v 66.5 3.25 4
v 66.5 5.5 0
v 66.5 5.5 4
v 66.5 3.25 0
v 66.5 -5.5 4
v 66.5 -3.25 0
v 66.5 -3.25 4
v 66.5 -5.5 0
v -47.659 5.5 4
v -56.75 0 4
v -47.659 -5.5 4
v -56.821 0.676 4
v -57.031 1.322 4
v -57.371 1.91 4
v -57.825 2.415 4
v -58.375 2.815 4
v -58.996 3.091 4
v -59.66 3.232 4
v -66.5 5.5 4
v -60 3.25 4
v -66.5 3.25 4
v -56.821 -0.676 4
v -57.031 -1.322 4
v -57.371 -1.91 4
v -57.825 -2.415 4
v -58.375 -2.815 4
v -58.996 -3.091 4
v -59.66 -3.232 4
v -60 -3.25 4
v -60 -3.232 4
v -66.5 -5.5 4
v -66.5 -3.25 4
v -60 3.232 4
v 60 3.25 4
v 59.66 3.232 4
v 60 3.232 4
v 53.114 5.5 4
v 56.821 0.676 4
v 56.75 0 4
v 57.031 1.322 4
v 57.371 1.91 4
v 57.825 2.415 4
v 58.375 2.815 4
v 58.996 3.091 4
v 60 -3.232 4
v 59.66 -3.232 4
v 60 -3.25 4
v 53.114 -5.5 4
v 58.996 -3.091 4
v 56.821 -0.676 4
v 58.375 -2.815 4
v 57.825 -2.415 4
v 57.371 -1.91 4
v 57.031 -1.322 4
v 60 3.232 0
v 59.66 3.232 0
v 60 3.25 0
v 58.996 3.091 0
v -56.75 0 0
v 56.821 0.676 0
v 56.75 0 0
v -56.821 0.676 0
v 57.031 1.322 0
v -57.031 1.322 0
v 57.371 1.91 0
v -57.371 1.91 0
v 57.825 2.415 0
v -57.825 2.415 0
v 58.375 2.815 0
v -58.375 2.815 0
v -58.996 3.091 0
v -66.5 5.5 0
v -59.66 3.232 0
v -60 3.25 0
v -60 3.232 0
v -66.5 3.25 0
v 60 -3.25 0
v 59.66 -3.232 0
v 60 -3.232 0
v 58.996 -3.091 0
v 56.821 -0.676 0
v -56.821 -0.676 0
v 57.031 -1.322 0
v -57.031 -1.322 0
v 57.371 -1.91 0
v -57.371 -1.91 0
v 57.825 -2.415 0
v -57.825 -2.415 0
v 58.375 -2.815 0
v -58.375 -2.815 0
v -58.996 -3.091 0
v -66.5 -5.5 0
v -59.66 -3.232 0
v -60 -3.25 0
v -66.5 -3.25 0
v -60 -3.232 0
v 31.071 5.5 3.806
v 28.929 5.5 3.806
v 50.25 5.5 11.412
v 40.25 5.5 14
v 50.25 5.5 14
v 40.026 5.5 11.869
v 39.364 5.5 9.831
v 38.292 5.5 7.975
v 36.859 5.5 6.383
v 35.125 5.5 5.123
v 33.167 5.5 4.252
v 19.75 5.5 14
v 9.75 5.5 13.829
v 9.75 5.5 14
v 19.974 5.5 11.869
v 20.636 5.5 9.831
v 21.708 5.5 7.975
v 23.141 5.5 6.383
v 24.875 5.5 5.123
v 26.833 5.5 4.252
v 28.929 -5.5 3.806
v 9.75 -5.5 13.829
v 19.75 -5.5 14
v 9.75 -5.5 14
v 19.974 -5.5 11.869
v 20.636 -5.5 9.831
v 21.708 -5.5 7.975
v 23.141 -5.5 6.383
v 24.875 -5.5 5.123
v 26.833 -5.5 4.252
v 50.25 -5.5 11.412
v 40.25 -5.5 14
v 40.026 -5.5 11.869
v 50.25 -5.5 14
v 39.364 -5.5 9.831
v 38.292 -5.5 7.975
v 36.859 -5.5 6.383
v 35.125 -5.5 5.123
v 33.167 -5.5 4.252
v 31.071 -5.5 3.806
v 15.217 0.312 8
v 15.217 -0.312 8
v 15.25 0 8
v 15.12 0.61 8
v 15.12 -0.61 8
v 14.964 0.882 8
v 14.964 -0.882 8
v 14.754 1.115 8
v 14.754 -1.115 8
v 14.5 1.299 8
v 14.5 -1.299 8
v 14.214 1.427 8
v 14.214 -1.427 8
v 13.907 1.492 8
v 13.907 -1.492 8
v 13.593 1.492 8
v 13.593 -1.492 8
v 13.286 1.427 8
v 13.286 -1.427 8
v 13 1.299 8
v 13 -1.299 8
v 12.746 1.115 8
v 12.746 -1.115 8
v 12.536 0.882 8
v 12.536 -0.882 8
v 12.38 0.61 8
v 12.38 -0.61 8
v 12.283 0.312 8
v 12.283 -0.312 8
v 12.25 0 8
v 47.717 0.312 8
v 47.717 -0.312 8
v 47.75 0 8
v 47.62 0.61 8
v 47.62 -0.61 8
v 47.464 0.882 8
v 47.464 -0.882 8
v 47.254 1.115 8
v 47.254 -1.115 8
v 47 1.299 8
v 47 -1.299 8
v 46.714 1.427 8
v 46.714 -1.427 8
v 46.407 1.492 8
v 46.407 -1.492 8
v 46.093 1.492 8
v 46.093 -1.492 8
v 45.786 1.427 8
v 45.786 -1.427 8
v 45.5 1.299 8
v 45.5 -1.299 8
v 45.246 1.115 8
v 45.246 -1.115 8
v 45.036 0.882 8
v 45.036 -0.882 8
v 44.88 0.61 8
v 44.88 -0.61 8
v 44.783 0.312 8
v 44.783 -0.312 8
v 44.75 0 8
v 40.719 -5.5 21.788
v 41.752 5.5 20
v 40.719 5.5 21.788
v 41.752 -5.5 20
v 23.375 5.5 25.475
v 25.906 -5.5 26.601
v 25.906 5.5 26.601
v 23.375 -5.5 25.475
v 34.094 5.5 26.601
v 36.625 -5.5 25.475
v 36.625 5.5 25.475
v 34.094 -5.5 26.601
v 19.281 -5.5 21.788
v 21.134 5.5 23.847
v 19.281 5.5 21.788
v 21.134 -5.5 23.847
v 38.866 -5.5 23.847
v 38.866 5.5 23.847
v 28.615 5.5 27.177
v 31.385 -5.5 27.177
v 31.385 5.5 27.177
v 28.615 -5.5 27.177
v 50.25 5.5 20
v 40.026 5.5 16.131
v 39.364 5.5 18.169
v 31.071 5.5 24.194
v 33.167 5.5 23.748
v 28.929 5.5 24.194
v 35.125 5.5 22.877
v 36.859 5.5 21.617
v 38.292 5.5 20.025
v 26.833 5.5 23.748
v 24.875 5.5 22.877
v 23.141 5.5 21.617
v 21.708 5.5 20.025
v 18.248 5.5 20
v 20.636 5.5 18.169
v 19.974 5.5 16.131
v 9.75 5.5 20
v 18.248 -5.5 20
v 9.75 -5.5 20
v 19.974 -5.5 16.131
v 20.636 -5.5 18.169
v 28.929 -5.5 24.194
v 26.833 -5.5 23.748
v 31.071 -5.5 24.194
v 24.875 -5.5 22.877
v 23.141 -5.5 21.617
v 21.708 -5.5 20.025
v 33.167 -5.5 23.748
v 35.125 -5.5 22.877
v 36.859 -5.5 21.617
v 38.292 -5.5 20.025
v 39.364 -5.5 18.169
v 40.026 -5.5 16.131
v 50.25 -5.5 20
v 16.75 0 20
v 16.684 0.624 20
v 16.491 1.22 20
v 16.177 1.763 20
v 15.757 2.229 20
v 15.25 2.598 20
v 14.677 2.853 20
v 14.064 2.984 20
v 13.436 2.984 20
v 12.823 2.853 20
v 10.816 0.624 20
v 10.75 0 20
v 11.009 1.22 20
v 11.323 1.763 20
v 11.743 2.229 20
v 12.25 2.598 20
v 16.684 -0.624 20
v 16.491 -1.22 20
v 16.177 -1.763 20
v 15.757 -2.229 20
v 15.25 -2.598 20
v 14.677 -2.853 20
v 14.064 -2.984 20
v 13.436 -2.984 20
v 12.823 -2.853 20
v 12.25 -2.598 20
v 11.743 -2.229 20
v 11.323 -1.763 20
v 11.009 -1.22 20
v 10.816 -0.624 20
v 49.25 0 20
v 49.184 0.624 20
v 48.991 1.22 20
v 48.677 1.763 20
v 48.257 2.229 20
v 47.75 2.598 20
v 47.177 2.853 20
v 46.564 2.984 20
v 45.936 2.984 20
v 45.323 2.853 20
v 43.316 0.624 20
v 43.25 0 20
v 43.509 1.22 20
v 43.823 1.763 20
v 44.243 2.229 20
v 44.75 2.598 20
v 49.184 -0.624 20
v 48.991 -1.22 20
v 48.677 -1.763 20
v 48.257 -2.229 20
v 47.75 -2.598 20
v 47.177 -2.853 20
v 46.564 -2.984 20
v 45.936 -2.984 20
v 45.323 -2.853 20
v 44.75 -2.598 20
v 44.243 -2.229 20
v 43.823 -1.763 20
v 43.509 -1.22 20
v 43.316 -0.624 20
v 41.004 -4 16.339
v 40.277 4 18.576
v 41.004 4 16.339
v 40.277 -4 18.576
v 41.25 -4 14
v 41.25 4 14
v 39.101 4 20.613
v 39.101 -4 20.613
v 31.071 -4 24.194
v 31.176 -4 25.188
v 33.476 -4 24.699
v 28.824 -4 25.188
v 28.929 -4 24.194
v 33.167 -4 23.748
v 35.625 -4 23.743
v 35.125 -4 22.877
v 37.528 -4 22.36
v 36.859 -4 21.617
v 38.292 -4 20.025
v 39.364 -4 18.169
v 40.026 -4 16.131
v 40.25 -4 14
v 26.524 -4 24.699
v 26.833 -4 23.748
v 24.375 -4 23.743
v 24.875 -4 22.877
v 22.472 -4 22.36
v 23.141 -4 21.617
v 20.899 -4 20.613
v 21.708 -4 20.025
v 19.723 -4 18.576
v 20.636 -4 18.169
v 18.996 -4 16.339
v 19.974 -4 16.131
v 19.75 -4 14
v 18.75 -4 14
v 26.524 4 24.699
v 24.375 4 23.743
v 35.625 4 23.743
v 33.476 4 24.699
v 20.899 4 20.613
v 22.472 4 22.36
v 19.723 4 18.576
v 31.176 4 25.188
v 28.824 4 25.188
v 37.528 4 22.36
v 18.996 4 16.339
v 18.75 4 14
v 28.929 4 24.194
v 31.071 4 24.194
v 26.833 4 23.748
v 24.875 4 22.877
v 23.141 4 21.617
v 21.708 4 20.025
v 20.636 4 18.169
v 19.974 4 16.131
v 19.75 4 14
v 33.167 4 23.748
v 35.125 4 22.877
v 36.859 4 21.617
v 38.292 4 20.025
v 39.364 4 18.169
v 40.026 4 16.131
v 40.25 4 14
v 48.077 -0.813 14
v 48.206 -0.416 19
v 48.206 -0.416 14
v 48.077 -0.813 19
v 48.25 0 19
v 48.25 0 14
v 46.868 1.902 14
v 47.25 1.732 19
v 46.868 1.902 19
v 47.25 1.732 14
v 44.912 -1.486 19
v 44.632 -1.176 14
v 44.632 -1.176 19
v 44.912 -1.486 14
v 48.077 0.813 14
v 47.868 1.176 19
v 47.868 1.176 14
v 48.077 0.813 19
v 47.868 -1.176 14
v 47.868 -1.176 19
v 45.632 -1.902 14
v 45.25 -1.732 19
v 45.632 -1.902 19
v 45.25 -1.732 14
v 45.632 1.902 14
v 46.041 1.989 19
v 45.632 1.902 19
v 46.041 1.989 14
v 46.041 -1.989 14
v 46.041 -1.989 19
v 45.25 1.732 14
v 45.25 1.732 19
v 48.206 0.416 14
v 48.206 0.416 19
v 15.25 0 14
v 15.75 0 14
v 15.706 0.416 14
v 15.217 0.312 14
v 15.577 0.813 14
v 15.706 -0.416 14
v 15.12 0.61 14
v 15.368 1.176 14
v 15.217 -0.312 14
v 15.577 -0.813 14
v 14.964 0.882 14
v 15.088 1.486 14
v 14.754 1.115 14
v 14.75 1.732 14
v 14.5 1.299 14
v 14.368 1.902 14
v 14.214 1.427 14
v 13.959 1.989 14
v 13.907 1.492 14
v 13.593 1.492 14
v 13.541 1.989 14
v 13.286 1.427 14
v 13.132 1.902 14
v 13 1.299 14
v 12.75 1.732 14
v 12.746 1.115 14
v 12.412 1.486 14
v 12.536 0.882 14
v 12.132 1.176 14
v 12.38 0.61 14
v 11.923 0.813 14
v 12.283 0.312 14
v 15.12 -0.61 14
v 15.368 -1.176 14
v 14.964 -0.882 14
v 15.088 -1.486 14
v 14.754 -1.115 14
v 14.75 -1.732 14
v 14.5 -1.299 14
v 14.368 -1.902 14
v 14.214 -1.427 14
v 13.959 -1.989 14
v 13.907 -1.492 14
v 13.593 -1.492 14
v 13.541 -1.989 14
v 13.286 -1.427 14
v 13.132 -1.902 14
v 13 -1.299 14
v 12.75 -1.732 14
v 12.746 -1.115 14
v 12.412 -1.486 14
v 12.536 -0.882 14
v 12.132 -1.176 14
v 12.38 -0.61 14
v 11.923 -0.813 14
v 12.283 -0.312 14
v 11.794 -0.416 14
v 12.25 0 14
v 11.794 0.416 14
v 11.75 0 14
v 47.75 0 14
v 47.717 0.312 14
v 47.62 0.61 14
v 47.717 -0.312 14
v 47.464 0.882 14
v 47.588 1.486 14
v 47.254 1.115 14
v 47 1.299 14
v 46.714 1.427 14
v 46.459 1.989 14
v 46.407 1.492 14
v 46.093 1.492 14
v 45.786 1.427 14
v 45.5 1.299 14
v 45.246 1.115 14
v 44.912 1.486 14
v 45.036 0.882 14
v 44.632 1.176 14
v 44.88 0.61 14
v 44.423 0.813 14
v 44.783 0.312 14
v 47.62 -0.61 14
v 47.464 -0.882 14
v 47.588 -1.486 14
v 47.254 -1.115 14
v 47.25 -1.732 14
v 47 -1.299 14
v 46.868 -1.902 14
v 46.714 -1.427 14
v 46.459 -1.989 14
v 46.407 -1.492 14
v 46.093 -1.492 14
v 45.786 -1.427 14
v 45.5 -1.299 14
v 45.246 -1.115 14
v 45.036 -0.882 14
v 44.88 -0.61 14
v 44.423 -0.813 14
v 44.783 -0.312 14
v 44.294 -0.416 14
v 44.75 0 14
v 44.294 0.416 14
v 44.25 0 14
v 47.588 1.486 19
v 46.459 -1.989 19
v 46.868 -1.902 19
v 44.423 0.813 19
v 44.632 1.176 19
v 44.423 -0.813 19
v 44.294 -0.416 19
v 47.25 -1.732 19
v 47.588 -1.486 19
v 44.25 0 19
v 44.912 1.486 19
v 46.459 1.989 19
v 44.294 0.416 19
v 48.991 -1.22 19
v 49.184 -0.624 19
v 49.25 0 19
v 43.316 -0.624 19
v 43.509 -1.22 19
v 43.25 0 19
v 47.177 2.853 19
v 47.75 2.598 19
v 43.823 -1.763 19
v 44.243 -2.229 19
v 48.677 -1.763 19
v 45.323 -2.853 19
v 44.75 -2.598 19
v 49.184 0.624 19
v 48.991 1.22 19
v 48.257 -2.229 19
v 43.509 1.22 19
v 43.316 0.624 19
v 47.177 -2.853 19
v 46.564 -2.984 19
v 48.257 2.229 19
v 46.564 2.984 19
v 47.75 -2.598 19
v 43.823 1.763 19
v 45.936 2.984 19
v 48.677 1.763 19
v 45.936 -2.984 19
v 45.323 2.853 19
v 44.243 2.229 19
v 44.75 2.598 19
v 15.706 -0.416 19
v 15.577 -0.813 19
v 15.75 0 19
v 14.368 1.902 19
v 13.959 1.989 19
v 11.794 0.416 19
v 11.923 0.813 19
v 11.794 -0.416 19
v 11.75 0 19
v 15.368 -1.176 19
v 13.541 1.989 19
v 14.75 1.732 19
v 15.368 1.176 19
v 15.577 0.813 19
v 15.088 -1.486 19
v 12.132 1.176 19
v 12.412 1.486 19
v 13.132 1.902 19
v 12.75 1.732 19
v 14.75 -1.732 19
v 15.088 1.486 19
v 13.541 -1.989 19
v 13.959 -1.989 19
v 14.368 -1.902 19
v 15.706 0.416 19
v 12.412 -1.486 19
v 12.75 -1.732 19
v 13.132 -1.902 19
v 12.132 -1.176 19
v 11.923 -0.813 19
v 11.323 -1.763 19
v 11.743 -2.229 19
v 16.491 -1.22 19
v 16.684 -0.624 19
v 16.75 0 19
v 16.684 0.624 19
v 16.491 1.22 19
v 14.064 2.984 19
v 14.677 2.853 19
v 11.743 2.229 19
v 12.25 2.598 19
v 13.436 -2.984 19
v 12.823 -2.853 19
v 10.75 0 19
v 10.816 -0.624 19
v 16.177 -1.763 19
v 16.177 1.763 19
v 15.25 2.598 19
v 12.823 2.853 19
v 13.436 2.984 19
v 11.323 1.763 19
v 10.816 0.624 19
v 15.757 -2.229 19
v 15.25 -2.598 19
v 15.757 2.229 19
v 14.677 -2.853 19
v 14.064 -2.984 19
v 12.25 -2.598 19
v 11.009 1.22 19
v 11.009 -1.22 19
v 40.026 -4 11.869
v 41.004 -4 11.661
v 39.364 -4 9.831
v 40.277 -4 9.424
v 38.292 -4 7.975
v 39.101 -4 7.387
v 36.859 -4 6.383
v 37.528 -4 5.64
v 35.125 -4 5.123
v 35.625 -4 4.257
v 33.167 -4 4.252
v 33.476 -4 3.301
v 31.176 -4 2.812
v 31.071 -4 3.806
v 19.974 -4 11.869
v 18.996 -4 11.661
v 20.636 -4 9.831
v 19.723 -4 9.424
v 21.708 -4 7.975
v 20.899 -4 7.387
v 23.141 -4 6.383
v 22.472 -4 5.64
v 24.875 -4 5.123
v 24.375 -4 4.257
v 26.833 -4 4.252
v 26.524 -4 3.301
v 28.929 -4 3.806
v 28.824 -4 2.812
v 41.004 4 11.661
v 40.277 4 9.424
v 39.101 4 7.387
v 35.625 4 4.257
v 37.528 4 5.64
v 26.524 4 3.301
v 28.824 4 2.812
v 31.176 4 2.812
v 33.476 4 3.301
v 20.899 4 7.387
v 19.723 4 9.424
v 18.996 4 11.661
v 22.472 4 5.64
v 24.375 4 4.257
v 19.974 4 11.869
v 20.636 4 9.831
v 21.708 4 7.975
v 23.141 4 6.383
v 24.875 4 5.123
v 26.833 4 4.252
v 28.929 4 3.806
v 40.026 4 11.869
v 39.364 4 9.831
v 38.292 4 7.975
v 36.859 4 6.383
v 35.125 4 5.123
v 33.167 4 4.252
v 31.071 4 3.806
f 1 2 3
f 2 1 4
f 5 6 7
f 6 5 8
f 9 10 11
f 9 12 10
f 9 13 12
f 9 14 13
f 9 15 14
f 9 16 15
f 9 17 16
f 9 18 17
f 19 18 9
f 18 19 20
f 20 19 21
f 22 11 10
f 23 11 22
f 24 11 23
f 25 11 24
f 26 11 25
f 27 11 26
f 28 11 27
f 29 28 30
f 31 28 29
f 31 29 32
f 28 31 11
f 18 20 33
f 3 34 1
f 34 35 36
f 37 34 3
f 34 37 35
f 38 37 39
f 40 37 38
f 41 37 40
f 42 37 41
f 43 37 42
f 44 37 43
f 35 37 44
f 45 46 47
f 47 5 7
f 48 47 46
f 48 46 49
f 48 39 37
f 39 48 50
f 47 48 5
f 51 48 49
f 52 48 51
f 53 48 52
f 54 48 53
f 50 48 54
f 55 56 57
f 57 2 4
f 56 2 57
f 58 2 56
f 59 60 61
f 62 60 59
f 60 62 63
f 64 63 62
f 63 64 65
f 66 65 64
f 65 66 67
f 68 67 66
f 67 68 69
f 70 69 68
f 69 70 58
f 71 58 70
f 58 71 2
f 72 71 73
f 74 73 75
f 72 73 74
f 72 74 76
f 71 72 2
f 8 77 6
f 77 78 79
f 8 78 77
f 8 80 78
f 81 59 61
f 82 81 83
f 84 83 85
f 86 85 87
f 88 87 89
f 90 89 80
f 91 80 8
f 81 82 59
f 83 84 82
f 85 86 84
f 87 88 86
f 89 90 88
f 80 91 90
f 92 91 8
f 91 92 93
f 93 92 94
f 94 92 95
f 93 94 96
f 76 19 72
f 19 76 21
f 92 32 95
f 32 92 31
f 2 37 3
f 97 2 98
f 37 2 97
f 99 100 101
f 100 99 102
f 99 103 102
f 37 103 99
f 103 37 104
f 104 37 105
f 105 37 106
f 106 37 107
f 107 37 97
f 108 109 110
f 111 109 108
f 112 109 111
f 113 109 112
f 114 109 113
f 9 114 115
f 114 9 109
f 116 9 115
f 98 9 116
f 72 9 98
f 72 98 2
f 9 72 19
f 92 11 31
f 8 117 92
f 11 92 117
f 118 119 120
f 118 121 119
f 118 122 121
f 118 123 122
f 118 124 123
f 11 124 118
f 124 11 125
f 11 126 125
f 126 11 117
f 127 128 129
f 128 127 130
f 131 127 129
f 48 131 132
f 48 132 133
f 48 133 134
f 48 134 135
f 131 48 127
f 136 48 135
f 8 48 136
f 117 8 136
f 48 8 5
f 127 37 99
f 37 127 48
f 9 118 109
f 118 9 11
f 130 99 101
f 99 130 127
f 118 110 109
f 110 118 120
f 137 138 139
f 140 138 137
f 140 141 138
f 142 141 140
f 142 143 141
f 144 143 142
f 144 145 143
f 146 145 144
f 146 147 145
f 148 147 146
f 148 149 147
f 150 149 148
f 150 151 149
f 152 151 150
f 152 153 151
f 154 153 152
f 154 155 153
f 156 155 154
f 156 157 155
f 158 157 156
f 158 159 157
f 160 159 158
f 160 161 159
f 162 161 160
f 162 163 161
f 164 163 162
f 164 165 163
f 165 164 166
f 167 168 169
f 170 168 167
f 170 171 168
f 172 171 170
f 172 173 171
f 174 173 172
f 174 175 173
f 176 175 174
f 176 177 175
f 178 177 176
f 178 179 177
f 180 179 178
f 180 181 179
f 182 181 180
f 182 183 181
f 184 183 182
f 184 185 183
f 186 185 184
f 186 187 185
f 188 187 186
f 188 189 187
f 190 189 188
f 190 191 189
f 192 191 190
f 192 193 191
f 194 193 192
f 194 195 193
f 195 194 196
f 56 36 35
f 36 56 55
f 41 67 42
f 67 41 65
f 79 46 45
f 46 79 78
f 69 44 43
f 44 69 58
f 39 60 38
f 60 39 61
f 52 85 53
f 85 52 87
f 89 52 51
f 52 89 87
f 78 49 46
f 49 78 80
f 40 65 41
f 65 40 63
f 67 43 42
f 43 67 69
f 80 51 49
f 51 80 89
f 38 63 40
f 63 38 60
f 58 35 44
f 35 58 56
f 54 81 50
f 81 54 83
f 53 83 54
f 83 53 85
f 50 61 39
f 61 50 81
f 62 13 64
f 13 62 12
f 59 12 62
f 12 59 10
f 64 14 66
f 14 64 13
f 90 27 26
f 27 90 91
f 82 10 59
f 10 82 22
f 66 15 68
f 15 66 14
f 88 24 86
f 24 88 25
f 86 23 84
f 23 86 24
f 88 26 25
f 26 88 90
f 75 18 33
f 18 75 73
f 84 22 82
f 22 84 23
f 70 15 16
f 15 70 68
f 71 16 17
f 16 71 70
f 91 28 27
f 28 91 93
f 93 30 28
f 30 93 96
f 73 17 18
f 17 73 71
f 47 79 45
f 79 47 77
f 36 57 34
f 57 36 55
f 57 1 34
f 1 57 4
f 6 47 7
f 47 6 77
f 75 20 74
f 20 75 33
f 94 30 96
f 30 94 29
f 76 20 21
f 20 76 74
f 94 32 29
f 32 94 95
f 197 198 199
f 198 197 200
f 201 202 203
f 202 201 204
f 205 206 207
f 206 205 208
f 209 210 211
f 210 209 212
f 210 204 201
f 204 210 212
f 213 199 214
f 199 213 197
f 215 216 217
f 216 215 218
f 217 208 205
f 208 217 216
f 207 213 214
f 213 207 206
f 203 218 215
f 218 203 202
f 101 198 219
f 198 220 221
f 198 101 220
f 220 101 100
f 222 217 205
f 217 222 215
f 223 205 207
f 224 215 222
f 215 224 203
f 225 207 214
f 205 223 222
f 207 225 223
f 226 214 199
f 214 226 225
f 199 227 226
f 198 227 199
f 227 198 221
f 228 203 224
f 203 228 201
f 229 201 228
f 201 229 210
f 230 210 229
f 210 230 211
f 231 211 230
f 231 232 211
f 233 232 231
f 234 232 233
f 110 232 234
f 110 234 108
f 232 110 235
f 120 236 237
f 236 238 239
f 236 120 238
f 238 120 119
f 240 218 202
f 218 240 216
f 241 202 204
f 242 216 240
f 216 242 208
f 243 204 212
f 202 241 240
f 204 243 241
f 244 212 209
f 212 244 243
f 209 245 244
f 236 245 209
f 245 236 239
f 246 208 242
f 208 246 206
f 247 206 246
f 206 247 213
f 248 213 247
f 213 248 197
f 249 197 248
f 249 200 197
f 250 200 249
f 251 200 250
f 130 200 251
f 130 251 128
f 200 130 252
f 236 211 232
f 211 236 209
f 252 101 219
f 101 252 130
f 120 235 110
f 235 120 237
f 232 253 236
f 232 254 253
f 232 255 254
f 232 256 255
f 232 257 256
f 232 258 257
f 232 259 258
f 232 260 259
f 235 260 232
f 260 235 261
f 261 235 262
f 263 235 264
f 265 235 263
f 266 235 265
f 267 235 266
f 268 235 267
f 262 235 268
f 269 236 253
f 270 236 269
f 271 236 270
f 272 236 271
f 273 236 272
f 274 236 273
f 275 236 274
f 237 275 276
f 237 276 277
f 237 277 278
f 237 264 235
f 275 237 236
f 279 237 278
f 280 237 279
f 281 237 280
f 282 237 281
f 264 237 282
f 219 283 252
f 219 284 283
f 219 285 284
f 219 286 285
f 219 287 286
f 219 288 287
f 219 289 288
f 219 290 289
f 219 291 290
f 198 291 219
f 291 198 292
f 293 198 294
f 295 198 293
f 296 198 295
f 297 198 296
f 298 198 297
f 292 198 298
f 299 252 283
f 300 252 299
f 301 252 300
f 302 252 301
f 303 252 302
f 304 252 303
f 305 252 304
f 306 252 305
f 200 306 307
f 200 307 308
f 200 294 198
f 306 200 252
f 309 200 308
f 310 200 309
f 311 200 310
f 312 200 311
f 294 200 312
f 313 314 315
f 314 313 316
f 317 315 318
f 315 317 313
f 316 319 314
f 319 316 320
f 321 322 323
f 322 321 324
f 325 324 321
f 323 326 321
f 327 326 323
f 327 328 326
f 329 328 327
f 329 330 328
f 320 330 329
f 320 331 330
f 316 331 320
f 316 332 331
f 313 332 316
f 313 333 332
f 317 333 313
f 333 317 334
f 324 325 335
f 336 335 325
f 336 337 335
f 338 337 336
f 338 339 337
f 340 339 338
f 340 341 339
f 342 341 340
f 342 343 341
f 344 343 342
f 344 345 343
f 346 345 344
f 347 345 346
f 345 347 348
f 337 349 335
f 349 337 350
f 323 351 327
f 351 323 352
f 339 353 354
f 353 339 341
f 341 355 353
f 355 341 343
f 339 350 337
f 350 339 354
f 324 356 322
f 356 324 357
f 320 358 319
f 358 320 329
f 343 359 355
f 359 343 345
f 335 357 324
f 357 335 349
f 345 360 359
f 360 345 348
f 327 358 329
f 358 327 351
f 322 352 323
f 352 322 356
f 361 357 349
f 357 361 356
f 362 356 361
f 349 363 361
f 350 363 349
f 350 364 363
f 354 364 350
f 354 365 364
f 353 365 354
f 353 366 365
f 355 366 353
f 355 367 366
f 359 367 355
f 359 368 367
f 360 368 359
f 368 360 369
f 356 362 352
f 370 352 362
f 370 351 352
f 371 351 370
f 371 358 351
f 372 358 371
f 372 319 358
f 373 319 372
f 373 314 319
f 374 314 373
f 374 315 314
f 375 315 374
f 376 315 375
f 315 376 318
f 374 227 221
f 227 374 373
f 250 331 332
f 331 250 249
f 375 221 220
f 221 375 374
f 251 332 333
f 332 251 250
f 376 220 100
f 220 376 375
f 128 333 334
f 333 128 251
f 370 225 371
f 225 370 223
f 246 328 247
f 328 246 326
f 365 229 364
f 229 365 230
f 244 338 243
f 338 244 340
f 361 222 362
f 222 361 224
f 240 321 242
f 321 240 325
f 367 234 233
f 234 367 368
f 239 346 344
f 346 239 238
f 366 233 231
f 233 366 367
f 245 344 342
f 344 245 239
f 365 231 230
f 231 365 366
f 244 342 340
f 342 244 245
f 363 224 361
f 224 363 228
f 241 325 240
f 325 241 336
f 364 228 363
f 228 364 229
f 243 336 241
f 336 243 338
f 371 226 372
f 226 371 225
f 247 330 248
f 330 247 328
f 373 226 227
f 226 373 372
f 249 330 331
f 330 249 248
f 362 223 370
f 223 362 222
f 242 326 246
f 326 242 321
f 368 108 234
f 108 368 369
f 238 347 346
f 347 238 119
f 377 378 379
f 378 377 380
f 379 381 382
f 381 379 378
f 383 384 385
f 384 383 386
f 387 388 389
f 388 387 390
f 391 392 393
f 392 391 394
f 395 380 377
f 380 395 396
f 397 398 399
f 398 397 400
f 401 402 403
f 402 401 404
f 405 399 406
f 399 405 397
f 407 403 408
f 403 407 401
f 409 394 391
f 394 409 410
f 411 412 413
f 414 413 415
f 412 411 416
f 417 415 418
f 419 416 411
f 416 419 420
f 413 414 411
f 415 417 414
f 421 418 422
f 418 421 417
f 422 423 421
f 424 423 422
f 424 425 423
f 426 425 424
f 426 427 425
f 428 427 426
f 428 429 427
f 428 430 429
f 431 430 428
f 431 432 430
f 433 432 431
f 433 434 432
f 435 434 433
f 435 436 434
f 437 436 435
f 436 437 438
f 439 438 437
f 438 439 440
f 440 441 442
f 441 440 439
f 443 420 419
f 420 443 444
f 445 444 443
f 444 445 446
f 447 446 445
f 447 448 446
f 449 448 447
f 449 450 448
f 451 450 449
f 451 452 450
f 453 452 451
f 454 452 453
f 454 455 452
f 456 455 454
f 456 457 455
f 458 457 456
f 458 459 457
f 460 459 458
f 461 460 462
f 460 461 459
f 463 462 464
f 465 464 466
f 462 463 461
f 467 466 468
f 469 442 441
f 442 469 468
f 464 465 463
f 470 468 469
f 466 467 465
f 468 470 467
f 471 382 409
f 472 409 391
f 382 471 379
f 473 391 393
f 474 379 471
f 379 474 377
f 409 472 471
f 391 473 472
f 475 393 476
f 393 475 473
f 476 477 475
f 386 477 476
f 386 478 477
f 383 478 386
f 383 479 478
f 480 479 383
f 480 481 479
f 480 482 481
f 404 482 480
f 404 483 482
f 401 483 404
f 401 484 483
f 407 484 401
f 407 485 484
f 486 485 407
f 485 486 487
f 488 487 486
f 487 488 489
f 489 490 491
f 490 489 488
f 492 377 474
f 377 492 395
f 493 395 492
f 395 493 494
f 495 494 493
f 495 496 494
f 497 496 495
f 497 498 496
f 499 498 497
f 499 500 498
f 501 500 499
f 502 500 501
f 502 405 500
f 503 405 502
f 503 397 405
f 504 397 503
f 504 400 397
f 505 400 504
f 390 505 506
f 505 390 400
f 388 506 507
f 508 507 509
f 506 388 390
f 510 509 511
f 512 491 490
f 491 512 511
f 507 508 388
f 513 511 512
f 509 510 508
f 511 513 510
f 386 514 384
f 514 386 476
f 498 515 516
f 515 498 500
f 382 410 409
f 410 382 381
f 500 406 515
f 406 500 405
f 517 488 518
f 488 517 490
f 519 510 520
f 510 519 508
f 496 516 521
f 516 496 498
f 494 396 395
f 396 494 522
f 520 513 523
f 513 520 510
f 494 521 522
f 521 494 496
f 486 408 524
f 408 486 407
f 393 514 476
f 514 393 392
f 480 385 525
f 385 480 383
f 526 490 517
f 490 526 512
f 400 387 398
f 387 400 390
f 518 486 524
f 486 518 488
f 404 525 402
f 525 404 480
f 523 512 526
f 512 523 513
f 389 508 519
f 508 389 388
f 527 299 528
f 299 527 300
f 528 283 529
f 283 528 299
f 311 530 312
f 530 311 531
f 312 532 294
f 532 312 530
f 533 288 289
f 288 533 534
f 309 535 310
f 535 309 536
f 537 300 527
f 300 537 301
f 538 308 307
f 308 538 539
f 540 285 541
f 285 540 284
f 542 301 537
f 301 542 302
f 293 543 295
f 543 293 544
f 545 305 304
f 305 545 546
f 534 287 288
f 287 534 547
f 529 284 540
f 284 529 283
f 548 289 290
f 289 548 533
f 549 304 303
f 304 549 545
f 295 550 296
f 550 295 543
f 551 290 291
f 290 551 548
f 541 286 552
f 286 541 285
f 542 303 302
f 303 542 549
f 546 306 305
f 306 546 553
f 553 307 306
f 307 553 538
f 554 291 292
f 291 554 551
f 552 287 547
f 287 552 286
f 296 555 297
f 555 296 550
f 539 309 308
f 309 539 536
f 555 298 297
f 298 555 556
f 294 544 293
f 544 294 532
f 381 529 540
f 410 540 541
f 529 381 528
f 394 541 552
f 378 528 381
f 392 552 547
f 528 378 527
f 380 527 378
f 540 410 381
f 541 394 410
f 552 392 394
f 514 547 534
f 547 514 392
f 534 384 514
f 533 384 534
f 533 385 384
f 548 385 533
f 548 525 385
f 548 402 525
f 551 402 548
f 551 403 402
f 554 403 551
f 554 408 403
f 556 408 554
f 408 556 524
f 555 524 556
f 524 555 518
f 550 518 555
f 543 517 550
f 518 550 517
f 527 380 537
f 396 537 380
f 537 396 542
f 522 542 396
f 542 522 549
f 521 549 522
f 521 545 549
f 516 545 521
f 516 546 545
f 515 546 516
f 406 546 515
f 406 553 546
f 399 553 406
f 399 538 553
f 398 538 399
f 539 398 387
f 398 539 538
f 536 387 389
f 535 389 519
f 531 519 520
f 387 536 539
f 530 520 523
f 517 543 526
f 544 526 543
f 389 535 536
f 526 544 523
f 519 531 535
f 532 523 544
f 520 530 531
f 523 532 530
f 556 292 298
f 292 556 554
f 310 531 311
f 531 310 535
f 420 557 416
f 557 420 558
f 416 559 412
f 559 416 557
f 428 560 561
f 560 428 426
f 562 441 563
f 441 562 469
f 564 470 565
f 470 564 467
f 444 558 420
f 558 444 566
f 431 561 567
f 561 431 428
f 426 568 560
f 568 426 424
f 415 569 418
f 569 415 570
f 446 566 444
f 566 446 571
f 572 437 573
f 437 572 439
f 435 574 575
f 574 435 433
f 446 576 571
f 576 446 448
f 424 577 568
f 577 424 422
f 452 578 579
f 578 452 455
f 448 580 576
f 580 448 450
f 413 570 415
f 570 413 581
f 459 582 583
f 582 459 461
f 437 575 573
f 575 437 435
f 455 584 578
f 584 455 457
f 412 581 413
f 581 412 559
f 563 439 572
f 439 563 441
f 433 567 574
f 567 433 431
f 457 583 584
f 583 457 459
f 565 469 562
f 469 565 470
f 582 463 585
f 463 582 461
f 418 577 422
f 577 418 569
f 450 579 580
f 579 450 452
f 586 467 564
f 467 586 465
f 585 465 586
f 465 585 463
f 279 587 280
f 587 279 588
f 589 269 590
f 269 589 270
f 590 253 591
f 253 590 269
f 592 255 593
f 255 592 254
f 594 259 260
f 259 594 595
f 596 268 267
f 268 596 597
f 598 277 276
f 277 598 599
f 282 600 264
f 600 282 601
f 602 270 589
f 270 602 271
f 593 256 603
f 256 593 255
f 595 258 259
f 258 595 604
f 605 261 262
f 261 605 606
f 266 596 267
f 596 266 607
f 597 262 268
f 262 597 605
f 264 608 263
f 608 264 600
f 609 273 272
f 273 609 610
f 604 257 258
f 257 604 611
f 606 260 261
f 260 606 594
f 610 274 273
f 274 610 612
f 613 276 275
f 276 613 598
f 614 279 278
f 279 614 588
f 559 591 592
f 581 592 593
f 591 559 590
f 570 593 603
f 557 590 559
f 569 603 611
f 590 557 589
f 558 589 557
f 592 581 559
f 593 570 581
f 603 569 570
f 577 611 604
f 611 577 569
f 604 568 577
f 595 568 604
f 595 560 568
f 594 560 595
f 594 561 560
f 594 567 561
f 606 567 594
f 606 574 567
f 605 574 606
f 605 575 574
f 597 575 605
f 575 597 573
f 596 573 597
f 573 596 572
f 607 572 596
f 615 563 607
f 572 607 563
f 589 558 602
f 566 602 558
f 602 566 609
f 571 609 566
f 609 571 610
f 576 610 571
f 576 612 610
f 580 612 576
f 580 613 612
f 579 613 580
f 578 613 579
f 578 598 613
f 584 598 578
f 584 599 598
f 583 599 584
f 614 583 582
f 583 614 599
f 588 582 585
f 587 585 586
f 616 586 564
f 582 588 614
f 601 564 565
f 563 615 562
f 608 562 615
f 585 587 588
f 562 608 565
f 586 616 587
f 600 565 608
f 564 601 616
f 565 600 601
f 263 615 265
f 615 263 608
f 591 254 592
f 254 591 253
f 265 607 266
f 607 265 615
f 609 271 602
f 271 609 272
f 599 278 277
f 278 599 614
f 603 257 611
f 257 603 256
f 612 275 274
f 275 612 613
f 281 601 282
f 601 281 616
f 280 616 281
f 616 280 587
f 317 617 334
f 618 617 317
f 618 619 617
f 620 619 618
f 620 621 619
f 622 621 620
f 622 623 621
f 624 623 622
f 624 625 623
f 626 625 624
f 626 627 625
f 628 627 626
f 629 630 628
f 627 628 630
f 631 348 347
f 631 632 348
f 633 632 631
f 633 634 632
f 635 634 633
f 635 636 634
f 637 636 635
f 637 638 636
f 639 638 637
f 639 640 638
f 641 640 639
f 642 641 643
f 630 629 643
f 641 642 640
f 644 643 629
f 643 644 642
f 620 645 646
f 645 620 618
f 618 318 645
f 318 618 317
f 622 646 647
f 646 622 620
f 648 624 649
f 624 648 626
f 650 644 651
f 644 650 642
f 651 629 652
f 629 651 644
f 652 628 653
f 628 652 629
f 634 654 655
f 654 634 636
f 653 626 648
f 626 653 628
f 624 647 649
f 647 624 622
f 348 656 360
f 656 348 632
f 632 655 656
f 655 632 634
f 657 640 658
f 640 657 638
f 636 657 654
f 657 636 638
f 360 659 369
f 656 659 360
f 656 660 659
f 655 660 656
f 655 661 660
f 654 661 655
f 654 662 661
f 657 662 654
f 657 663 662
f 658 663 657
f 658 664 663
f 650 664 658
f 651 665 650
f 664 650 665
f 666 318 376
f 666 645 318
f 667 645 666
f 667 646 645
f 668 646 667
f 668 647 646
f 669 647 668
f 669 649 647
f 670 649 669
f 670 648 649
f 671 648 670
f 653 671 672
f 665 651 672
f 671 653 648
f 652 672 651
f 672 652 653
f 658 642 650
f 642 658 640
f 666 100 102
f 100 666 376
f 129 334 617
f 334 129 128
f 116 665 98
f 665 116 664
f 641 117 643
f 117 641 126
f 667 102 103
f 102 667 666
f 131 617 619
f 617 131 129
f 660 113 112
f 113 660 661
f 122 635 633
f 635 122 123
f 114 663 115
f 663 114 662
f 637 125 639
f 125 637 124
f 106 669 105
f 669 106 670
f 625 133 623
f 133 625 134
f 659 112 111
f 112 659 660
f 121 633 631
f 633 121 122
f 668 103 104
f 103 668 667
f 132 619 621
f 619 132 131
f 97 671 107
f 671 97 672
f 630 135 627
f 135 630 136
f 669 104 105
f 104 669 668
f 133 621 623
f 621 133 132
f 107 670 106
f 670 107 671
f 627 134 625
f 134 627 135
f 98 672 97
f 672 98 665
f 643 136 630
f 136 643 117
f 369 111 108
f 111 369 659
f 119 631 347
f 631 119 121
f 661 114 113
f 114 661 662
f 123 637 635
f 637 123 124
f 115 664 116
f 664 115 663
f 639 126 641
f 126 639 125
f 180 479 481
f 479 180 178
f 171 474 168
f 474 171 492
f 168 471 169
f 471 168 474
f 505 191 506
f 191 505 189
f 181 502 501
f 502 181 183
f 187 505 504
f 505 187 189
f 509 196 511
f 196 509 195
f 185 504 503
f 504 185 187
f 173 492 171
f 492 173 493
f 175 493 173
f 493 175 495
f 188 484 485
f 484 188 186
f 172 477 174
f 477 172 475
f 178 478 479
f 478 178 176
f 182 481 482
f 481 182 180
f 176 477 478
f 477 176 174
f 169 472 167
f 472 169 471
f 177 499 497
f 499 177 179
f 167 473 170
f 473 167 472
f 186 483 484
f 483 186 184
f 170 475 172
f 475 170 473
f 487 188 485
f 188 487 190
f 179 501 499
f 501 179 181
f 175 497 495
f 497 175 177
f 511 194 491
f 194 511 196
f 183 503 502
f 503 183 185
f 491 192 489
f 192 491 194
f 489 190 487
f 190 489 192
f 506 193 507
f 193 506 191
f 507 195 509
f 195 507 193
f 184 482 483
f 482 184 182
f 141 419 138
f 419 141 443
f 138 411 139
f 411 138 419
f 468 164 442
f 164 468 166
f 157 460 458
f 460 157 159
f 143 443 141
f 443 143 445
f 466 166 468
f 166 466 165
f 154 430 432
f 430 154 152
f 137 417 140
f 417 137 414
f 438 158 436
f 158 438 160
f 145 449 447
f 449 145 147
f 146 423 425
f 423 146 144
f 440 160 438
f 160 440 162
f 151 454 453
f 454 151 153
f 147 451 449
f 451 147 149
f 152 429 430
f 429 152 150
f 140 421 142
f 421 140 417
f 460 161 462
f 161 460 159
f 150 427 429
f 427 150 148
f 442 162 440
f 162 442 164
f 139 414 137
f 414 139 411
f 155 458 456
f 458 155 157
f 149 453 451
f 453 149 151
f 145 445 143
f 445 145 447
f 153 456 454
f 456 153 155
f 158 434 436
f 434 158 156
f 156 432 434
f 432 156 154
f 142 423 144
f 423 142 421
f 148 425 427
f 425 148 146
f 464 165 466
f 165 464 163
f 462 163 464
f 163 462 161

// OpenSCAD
// file: bearing.scad
$fn=30;
drive_axle_r = 8.1/2;
drive_axle_bearing_id = 8;
drive_axle_bearing_od = 22.5;
drive_axle_bearing_t = 8;

bearing_holder_wall = 1.2;
bearing_holder_tie_hole_r = 3/2;
bearing_holder_cut = -1;

bearing_pillow_rim_t = 2;
bearing_pillow_side_t = 1.5;
bearing_pillow_screw_thread_r = 3/2;
bearing_pillow_screw_shank_r = 4/2;
bearing_pillow_screw_head_r = 6/2;

module bearing(id = drive_axle_bearing_id, od = drive_axle_bearing_od, t = drive_axle_bearing_t) {
    difference() {
        cylinder(r=od/2, h=t, center=true);
        cylinder(r=id/2, h=t*2, center=true);
    }
}

module bearing_holder(
    od = drive_axle_bearing_od,
    t = drive_axle_bearing_t,
    wall=bearing_holder_wall,
    tie_hole_r = bearing_holder_tie_hole_r
) {
    extra_length = wall*4 + tie_hole_r*4;
    tie_width = wall*2 + tie_hole_r*6;
    difference() {
        union() {
            cylinder(r=od/2+wall, h=t+wall*2, center=true);
            cube([od+extra_length,tie_width,t+wall*2], center=true);
        }
        cylinder(r=od/2-wall, h=t*3, center=true);
        bearing();
        translate([od/2+wall+tie_hole_r,tie_hole_r*2,0])
        cylinder(r=tie_hole_r, h=t*2, center=true);
        translate([-od/2-wall-tie_hole_r,tie_hole_r*2,0])
        cylinder(r=tie_hole_r, h=t*2, center=true);

        translate([od/2+wall+tie_hole_r,-tie_hole_r*2,0])
        cylinder(r=tie_hole_r, h=t*2, center=true);
        translate([-od/2-wall-tie_hole_r,-tie_hole_r*2,0])
        cylinder(r=tie_hole_r, h=t*2, center=true);
    }
}

module bearing_holder_negative(
    od = drive_axle_bearing_od,
    t = drive_axle_bearing_od +bearing_pillow_rim_t*2,
    wall=bearing_pillow_side_t,
    //tie_hole_r = bearing_holder_tie_hole_r
) {
    //extra_length = wall*4 + tie_hole_r*4-.2;
    //tie_width = wall*2 + tie_hole_r*6-.2;
        union() {
            cylinder(r=od/2+wall-.2, h=t+wall*2, center=true);
          //  cube([od+extra_length,tie_width,t+wall*2], center=true);
        }
     
}
//bearing_holder_negative();

module bearing_holder_bottom(
    od = drive_axle_bearing_od,
    t = drive_axle_bearing_t,
    wall=bearing_holder_wall,
    cut = bearing_holder_cut
) {
    
    difference() {
        bearing_holder();
        translate([0,0,od*3/2-cut])
        cube([od*2,od*3,od*3], center=true);
        translate([0,0,-cut])
        bearing_holder_keyway();
    }
}
//bearing_holder_bottom();

module bearing_holder_top(
    od = drive_axle_bearing_od,
    t = drive_axle_bearing_t,
    wall=bearing_holder_wall,
    cut = bearing_holder_cut
) {
    
    difference() {
        bearing_holder(od=od, t=t, wall=wall, cut=cut);
        translate([0,0,-od*3/2-cut])
        cube([od*2,od*3,od*3], center=true);
    }
    translate([0,0,-cut])
    bearing_holder_key();
}
//rotate(180,[1,0,0])
//bearing_holder_top();

module bearing_holder_pair(
    od = drive_axle_bearing_od,
    t = drive_axle_bearing_t,
    wall=bearing_holder_wall
){
    translate([0,-od/2-wall-2,t/2+wall])
    rotate(180, [0,1,0])
    bearing_holder_top();
    translate([0,od/2+wall+2,t/2+wall])
    bearing_holder_bottom();
}
//bearing_holder_pair();

module bearing_holder_key(
    od = drive_axle_bearing_od,
    t = drive_axle_bearing_t,
    wall=bearing_holder_wall,
    tie_hole_r = bearing_holder_tie_hole_r
) {
    translate([od/2+wall+tie_hole_r,0,0])
    cube([tie_hole_r*2,tie_hole_r,tie_hole_r], center=true);
    translate([-od/2-wall-tie_hole_r,0,0])
    cube([tie_hole_r*2,tie_hole_r,tie_hole_r], center=true);
}
module bearing_holder_keyway(
    od = drive_axle_bearing_od,
    t = drive_axle_bearing_t,
    wall=bearing_holder_wall,
    tie_hole_r = bearing_holder_tie_hole_r,
    clearance = 1
) {
    translate([od/2+wall+tie_hole_r,0,0])
    cube([tie_hole_r*2+clearance,tie_hole_r+clearance,tie_hole_r+clearance], center=true);
    translate([-od/2-wall-tie_hole_r,0,0])
    cube([tie_hole_r*2+clearance,tie_hole_r+clearance,tie_hole_r+clearance], center=true);
}

module bearing_pillow() {

    difference() {
        union() {
            cylinder(r=drive_axle_bearing_od/2 + bearing_pillow_rim_t, h=drive_axle_bearing_t + bearing_pillow_side_t*2, center=true);
            cube([drive_axle_bearing_od+bearing_pillow_rim_t*2+bearing_pillow_screw_head_r*4+2,12,drive_axle_bearing_t + bearing_pillow_side_t*2], center=true);
        }
      cylinder(r=drive_axle_bearing_od/2 - 1, h=drive_axle_bearing_t*8, center=true);
      bearing();
        
      translate([drive_axle_bearing_od/2+bearing_pillow_rim_t+bearing_pillow_screw_head_r,0,0])
        rotate(90,[1,0,0]) 
            cylinder(r=bearing_pillow_screw_thread_r, h=50, center=true);
      translate([drive_axle_bearing_od/2+bearing_pillow_rim_t+bearing_pillow_screw_head_r,10,0])
        rotate(90,[1,0,0]) 
            cylinder(r=bearing_pillow_screw_shank_r, h=20, center=true);
      translate([drive_axle_bearing_od/2+bearing_pillow_rim_t+bearing_pillow_screw_head_r,15,0])
        rotate(90,[1,0,0]) 
            cylinder(r=bearing_pillow_screw_head_r, h=20, center=true);

      translate([-drive_axle_bearing_od/2-bearing_pillow_rim_t-bearing_pillow_screw_head_r,0,0])
        rotate(90,[1,0,0]) 
            cylinder(r=bearing_pillow_screw_thread_r, h=50, center=true);
      translate([-drive_axle_bearing_od/2-bearing_pillow_rim_t-bearing_pillow_screw_head_r,10,0])
        rotate(90,[1,0,0]) 
            cylinder(r=bearing_pillow_screw_shank_r, h=20, center=true);
      translate([-drive_axle_bearing_od/2-bearing_pillow_rim_t-bearing_pillow_screw_head_r,15,0])
        rotate(90,[1,0,0]) 
            cylinder(r=bearing_pillow_screw_head_r, h=20, center=true);
    }
}
module bearing_pillow_negative() {

    cylinder(r=drive_axle_bearing_od/2 + bearing_pillow_rim_t, h=drive_axle_bearing_t + bearing_pillow_side_t*2, center=true);
    cylinder(r=drive_axle_bearing_od/2 + bearing_pillow_rim_t-1, h=drive_axle_bearing_t *4, center=true);
    cube([drive_axle_bearing_od+bearing_pillow_rim_t*2+bearing_pillow_screw_head_r*4+2,12,drive_axle_bearing_t + bearing_pillow_side_t*2], center=true);

}
//%bearing_pillow();
//bearing_pillow_negative();
module bearing_pillow_top() {
   difference() {
        bearing_pillow();
        translate([0,-50,0])
            cube([100,100,100], center=true);
   } 
}
module bearing_pillow_bottom() {
   difference() {
        bearing_pillow();
        translate([0,50,0])
            cube([100,100,100], center=true);
   } 
}
//bearing_pillow_top();
//translate([0,-5,0])
//bearing_pillow_bottom();
//bearing_pillow();
//bearing_holder();
//bearing();
// file: rods.scad
//include <tracer.scad>
//include <tracer_bearing.scad>
include <bearing.scad>

$fn = 60;

frame_x = 60*2;
frame_y = frame_x;

frame_rod_r = 6.5/2;
frame_length = 500;

drive_axle_r = 8.5/2;
//inboard
//drive_position_x = frame_x/2 - drive_axle_bearing_od/2 - bearing_holder_wall - frame_rod_r;
//drive_position_y = frame_y/2 - drive_axle_bearing_od/2 - bearing_holder_wall - frame_rod_r;
//outboard
drive_position_x = frame_x/2+ drive_axle_bearing_od/2+bearing_pillow_rim_t;
drive_position_y = 0;
drive_axle_bearing_od = 22;

module frame_rod(r = frame_rod_r, h = frame_length) {
    cylinder(r =r, h = h);
}
module drive_axle(r = drive_axle_r, h = frame_length) {
    cylinder(r =r, h = h);
}
//frame_rod();


module frame_rods(x=frame_x, y = frame_y, r = frame_rod_r) {
    translate([x/2,y/2,0])
        frame_rod(r = r);
    translate([-x/2,y/2,0])
        frame_rod(r = r);
    translate([x/2,-y/2,0])
        frame_rod(r = r);
    translate([-x/2,-y/2,0])
        frame_rod(r = r);
    translate([drive_position_x,drive_position_y,0])
        drive_axle();
}

//frame_rods();
// main file
include <rods.scad>
include <bearing.scad>

//frame_rods();
pull_axle_offset = frame_x/4;
pull_axle_z = 10;

sidebar_tab_t = 4;
sidebar_w = drive_axle_bearing_t+bearing_pillow_side_t*2;

//translate([0,frame_y/2,0]) 
union() {
    difference() {
        union() {
            translate([0,0,sidebar_tab_t/2])
        cube([frame_x+frame_rod_r*4,sidebar_w,sidebar_tab_t],center=true);
            translate([0,0,sidebar_tab_t-1])
            rotate(90,[1,0,0])
linear_extrude(height=sidebar_w, center=true)
polygon([
    [-frame_x/2 + frame_rod_r*2 , 0],
    [frame_x/2 - frame_rod_r*2 , 0],
    [pull_axle_offset+drive_axle_bearing_od/2+bearing_pillow_rim_t+bearing_pillow_screw_head_r*2,pull_axle_z+1],
    [pull_axle_offset-drive_axle_bearing_od/2-bearing_pillow_rim_t-bearing_pillow_screw_head_r*2,pull_axle_z+1],
]);
        }
        translate([pull_axle_offset,0,pull_axle_z+sidebar_tab_t]) 
            rotate(90,[1,0,0])
                bearing_pillow_negative();
        //rod slots
        translate([frame_x/2+frame_rod_r*2,0,0])
            cube([frame_rod_r*4,frame_rod_r*2,20],center=true);
        translate([-frame_x/2-frame_rod_r*2,0,0])
            cube([frame_rod_r*4,frame_rod_r*2,20],center=true);
translate([0,frame_y/2,-20]) 
            frame_rods();
    }
    translate([pull_axle_offset,0,pull_axle_z+sidebar_tab_t]) 
    rotate(90,[1,0,0])
        bearing_pillow_top();
    translate([pull_axle_offset,0,pull_axle_z+sidebar_tab_t]) 
   rotate(90,[1,0,0])
        bearing_pillow_bottom();
}
